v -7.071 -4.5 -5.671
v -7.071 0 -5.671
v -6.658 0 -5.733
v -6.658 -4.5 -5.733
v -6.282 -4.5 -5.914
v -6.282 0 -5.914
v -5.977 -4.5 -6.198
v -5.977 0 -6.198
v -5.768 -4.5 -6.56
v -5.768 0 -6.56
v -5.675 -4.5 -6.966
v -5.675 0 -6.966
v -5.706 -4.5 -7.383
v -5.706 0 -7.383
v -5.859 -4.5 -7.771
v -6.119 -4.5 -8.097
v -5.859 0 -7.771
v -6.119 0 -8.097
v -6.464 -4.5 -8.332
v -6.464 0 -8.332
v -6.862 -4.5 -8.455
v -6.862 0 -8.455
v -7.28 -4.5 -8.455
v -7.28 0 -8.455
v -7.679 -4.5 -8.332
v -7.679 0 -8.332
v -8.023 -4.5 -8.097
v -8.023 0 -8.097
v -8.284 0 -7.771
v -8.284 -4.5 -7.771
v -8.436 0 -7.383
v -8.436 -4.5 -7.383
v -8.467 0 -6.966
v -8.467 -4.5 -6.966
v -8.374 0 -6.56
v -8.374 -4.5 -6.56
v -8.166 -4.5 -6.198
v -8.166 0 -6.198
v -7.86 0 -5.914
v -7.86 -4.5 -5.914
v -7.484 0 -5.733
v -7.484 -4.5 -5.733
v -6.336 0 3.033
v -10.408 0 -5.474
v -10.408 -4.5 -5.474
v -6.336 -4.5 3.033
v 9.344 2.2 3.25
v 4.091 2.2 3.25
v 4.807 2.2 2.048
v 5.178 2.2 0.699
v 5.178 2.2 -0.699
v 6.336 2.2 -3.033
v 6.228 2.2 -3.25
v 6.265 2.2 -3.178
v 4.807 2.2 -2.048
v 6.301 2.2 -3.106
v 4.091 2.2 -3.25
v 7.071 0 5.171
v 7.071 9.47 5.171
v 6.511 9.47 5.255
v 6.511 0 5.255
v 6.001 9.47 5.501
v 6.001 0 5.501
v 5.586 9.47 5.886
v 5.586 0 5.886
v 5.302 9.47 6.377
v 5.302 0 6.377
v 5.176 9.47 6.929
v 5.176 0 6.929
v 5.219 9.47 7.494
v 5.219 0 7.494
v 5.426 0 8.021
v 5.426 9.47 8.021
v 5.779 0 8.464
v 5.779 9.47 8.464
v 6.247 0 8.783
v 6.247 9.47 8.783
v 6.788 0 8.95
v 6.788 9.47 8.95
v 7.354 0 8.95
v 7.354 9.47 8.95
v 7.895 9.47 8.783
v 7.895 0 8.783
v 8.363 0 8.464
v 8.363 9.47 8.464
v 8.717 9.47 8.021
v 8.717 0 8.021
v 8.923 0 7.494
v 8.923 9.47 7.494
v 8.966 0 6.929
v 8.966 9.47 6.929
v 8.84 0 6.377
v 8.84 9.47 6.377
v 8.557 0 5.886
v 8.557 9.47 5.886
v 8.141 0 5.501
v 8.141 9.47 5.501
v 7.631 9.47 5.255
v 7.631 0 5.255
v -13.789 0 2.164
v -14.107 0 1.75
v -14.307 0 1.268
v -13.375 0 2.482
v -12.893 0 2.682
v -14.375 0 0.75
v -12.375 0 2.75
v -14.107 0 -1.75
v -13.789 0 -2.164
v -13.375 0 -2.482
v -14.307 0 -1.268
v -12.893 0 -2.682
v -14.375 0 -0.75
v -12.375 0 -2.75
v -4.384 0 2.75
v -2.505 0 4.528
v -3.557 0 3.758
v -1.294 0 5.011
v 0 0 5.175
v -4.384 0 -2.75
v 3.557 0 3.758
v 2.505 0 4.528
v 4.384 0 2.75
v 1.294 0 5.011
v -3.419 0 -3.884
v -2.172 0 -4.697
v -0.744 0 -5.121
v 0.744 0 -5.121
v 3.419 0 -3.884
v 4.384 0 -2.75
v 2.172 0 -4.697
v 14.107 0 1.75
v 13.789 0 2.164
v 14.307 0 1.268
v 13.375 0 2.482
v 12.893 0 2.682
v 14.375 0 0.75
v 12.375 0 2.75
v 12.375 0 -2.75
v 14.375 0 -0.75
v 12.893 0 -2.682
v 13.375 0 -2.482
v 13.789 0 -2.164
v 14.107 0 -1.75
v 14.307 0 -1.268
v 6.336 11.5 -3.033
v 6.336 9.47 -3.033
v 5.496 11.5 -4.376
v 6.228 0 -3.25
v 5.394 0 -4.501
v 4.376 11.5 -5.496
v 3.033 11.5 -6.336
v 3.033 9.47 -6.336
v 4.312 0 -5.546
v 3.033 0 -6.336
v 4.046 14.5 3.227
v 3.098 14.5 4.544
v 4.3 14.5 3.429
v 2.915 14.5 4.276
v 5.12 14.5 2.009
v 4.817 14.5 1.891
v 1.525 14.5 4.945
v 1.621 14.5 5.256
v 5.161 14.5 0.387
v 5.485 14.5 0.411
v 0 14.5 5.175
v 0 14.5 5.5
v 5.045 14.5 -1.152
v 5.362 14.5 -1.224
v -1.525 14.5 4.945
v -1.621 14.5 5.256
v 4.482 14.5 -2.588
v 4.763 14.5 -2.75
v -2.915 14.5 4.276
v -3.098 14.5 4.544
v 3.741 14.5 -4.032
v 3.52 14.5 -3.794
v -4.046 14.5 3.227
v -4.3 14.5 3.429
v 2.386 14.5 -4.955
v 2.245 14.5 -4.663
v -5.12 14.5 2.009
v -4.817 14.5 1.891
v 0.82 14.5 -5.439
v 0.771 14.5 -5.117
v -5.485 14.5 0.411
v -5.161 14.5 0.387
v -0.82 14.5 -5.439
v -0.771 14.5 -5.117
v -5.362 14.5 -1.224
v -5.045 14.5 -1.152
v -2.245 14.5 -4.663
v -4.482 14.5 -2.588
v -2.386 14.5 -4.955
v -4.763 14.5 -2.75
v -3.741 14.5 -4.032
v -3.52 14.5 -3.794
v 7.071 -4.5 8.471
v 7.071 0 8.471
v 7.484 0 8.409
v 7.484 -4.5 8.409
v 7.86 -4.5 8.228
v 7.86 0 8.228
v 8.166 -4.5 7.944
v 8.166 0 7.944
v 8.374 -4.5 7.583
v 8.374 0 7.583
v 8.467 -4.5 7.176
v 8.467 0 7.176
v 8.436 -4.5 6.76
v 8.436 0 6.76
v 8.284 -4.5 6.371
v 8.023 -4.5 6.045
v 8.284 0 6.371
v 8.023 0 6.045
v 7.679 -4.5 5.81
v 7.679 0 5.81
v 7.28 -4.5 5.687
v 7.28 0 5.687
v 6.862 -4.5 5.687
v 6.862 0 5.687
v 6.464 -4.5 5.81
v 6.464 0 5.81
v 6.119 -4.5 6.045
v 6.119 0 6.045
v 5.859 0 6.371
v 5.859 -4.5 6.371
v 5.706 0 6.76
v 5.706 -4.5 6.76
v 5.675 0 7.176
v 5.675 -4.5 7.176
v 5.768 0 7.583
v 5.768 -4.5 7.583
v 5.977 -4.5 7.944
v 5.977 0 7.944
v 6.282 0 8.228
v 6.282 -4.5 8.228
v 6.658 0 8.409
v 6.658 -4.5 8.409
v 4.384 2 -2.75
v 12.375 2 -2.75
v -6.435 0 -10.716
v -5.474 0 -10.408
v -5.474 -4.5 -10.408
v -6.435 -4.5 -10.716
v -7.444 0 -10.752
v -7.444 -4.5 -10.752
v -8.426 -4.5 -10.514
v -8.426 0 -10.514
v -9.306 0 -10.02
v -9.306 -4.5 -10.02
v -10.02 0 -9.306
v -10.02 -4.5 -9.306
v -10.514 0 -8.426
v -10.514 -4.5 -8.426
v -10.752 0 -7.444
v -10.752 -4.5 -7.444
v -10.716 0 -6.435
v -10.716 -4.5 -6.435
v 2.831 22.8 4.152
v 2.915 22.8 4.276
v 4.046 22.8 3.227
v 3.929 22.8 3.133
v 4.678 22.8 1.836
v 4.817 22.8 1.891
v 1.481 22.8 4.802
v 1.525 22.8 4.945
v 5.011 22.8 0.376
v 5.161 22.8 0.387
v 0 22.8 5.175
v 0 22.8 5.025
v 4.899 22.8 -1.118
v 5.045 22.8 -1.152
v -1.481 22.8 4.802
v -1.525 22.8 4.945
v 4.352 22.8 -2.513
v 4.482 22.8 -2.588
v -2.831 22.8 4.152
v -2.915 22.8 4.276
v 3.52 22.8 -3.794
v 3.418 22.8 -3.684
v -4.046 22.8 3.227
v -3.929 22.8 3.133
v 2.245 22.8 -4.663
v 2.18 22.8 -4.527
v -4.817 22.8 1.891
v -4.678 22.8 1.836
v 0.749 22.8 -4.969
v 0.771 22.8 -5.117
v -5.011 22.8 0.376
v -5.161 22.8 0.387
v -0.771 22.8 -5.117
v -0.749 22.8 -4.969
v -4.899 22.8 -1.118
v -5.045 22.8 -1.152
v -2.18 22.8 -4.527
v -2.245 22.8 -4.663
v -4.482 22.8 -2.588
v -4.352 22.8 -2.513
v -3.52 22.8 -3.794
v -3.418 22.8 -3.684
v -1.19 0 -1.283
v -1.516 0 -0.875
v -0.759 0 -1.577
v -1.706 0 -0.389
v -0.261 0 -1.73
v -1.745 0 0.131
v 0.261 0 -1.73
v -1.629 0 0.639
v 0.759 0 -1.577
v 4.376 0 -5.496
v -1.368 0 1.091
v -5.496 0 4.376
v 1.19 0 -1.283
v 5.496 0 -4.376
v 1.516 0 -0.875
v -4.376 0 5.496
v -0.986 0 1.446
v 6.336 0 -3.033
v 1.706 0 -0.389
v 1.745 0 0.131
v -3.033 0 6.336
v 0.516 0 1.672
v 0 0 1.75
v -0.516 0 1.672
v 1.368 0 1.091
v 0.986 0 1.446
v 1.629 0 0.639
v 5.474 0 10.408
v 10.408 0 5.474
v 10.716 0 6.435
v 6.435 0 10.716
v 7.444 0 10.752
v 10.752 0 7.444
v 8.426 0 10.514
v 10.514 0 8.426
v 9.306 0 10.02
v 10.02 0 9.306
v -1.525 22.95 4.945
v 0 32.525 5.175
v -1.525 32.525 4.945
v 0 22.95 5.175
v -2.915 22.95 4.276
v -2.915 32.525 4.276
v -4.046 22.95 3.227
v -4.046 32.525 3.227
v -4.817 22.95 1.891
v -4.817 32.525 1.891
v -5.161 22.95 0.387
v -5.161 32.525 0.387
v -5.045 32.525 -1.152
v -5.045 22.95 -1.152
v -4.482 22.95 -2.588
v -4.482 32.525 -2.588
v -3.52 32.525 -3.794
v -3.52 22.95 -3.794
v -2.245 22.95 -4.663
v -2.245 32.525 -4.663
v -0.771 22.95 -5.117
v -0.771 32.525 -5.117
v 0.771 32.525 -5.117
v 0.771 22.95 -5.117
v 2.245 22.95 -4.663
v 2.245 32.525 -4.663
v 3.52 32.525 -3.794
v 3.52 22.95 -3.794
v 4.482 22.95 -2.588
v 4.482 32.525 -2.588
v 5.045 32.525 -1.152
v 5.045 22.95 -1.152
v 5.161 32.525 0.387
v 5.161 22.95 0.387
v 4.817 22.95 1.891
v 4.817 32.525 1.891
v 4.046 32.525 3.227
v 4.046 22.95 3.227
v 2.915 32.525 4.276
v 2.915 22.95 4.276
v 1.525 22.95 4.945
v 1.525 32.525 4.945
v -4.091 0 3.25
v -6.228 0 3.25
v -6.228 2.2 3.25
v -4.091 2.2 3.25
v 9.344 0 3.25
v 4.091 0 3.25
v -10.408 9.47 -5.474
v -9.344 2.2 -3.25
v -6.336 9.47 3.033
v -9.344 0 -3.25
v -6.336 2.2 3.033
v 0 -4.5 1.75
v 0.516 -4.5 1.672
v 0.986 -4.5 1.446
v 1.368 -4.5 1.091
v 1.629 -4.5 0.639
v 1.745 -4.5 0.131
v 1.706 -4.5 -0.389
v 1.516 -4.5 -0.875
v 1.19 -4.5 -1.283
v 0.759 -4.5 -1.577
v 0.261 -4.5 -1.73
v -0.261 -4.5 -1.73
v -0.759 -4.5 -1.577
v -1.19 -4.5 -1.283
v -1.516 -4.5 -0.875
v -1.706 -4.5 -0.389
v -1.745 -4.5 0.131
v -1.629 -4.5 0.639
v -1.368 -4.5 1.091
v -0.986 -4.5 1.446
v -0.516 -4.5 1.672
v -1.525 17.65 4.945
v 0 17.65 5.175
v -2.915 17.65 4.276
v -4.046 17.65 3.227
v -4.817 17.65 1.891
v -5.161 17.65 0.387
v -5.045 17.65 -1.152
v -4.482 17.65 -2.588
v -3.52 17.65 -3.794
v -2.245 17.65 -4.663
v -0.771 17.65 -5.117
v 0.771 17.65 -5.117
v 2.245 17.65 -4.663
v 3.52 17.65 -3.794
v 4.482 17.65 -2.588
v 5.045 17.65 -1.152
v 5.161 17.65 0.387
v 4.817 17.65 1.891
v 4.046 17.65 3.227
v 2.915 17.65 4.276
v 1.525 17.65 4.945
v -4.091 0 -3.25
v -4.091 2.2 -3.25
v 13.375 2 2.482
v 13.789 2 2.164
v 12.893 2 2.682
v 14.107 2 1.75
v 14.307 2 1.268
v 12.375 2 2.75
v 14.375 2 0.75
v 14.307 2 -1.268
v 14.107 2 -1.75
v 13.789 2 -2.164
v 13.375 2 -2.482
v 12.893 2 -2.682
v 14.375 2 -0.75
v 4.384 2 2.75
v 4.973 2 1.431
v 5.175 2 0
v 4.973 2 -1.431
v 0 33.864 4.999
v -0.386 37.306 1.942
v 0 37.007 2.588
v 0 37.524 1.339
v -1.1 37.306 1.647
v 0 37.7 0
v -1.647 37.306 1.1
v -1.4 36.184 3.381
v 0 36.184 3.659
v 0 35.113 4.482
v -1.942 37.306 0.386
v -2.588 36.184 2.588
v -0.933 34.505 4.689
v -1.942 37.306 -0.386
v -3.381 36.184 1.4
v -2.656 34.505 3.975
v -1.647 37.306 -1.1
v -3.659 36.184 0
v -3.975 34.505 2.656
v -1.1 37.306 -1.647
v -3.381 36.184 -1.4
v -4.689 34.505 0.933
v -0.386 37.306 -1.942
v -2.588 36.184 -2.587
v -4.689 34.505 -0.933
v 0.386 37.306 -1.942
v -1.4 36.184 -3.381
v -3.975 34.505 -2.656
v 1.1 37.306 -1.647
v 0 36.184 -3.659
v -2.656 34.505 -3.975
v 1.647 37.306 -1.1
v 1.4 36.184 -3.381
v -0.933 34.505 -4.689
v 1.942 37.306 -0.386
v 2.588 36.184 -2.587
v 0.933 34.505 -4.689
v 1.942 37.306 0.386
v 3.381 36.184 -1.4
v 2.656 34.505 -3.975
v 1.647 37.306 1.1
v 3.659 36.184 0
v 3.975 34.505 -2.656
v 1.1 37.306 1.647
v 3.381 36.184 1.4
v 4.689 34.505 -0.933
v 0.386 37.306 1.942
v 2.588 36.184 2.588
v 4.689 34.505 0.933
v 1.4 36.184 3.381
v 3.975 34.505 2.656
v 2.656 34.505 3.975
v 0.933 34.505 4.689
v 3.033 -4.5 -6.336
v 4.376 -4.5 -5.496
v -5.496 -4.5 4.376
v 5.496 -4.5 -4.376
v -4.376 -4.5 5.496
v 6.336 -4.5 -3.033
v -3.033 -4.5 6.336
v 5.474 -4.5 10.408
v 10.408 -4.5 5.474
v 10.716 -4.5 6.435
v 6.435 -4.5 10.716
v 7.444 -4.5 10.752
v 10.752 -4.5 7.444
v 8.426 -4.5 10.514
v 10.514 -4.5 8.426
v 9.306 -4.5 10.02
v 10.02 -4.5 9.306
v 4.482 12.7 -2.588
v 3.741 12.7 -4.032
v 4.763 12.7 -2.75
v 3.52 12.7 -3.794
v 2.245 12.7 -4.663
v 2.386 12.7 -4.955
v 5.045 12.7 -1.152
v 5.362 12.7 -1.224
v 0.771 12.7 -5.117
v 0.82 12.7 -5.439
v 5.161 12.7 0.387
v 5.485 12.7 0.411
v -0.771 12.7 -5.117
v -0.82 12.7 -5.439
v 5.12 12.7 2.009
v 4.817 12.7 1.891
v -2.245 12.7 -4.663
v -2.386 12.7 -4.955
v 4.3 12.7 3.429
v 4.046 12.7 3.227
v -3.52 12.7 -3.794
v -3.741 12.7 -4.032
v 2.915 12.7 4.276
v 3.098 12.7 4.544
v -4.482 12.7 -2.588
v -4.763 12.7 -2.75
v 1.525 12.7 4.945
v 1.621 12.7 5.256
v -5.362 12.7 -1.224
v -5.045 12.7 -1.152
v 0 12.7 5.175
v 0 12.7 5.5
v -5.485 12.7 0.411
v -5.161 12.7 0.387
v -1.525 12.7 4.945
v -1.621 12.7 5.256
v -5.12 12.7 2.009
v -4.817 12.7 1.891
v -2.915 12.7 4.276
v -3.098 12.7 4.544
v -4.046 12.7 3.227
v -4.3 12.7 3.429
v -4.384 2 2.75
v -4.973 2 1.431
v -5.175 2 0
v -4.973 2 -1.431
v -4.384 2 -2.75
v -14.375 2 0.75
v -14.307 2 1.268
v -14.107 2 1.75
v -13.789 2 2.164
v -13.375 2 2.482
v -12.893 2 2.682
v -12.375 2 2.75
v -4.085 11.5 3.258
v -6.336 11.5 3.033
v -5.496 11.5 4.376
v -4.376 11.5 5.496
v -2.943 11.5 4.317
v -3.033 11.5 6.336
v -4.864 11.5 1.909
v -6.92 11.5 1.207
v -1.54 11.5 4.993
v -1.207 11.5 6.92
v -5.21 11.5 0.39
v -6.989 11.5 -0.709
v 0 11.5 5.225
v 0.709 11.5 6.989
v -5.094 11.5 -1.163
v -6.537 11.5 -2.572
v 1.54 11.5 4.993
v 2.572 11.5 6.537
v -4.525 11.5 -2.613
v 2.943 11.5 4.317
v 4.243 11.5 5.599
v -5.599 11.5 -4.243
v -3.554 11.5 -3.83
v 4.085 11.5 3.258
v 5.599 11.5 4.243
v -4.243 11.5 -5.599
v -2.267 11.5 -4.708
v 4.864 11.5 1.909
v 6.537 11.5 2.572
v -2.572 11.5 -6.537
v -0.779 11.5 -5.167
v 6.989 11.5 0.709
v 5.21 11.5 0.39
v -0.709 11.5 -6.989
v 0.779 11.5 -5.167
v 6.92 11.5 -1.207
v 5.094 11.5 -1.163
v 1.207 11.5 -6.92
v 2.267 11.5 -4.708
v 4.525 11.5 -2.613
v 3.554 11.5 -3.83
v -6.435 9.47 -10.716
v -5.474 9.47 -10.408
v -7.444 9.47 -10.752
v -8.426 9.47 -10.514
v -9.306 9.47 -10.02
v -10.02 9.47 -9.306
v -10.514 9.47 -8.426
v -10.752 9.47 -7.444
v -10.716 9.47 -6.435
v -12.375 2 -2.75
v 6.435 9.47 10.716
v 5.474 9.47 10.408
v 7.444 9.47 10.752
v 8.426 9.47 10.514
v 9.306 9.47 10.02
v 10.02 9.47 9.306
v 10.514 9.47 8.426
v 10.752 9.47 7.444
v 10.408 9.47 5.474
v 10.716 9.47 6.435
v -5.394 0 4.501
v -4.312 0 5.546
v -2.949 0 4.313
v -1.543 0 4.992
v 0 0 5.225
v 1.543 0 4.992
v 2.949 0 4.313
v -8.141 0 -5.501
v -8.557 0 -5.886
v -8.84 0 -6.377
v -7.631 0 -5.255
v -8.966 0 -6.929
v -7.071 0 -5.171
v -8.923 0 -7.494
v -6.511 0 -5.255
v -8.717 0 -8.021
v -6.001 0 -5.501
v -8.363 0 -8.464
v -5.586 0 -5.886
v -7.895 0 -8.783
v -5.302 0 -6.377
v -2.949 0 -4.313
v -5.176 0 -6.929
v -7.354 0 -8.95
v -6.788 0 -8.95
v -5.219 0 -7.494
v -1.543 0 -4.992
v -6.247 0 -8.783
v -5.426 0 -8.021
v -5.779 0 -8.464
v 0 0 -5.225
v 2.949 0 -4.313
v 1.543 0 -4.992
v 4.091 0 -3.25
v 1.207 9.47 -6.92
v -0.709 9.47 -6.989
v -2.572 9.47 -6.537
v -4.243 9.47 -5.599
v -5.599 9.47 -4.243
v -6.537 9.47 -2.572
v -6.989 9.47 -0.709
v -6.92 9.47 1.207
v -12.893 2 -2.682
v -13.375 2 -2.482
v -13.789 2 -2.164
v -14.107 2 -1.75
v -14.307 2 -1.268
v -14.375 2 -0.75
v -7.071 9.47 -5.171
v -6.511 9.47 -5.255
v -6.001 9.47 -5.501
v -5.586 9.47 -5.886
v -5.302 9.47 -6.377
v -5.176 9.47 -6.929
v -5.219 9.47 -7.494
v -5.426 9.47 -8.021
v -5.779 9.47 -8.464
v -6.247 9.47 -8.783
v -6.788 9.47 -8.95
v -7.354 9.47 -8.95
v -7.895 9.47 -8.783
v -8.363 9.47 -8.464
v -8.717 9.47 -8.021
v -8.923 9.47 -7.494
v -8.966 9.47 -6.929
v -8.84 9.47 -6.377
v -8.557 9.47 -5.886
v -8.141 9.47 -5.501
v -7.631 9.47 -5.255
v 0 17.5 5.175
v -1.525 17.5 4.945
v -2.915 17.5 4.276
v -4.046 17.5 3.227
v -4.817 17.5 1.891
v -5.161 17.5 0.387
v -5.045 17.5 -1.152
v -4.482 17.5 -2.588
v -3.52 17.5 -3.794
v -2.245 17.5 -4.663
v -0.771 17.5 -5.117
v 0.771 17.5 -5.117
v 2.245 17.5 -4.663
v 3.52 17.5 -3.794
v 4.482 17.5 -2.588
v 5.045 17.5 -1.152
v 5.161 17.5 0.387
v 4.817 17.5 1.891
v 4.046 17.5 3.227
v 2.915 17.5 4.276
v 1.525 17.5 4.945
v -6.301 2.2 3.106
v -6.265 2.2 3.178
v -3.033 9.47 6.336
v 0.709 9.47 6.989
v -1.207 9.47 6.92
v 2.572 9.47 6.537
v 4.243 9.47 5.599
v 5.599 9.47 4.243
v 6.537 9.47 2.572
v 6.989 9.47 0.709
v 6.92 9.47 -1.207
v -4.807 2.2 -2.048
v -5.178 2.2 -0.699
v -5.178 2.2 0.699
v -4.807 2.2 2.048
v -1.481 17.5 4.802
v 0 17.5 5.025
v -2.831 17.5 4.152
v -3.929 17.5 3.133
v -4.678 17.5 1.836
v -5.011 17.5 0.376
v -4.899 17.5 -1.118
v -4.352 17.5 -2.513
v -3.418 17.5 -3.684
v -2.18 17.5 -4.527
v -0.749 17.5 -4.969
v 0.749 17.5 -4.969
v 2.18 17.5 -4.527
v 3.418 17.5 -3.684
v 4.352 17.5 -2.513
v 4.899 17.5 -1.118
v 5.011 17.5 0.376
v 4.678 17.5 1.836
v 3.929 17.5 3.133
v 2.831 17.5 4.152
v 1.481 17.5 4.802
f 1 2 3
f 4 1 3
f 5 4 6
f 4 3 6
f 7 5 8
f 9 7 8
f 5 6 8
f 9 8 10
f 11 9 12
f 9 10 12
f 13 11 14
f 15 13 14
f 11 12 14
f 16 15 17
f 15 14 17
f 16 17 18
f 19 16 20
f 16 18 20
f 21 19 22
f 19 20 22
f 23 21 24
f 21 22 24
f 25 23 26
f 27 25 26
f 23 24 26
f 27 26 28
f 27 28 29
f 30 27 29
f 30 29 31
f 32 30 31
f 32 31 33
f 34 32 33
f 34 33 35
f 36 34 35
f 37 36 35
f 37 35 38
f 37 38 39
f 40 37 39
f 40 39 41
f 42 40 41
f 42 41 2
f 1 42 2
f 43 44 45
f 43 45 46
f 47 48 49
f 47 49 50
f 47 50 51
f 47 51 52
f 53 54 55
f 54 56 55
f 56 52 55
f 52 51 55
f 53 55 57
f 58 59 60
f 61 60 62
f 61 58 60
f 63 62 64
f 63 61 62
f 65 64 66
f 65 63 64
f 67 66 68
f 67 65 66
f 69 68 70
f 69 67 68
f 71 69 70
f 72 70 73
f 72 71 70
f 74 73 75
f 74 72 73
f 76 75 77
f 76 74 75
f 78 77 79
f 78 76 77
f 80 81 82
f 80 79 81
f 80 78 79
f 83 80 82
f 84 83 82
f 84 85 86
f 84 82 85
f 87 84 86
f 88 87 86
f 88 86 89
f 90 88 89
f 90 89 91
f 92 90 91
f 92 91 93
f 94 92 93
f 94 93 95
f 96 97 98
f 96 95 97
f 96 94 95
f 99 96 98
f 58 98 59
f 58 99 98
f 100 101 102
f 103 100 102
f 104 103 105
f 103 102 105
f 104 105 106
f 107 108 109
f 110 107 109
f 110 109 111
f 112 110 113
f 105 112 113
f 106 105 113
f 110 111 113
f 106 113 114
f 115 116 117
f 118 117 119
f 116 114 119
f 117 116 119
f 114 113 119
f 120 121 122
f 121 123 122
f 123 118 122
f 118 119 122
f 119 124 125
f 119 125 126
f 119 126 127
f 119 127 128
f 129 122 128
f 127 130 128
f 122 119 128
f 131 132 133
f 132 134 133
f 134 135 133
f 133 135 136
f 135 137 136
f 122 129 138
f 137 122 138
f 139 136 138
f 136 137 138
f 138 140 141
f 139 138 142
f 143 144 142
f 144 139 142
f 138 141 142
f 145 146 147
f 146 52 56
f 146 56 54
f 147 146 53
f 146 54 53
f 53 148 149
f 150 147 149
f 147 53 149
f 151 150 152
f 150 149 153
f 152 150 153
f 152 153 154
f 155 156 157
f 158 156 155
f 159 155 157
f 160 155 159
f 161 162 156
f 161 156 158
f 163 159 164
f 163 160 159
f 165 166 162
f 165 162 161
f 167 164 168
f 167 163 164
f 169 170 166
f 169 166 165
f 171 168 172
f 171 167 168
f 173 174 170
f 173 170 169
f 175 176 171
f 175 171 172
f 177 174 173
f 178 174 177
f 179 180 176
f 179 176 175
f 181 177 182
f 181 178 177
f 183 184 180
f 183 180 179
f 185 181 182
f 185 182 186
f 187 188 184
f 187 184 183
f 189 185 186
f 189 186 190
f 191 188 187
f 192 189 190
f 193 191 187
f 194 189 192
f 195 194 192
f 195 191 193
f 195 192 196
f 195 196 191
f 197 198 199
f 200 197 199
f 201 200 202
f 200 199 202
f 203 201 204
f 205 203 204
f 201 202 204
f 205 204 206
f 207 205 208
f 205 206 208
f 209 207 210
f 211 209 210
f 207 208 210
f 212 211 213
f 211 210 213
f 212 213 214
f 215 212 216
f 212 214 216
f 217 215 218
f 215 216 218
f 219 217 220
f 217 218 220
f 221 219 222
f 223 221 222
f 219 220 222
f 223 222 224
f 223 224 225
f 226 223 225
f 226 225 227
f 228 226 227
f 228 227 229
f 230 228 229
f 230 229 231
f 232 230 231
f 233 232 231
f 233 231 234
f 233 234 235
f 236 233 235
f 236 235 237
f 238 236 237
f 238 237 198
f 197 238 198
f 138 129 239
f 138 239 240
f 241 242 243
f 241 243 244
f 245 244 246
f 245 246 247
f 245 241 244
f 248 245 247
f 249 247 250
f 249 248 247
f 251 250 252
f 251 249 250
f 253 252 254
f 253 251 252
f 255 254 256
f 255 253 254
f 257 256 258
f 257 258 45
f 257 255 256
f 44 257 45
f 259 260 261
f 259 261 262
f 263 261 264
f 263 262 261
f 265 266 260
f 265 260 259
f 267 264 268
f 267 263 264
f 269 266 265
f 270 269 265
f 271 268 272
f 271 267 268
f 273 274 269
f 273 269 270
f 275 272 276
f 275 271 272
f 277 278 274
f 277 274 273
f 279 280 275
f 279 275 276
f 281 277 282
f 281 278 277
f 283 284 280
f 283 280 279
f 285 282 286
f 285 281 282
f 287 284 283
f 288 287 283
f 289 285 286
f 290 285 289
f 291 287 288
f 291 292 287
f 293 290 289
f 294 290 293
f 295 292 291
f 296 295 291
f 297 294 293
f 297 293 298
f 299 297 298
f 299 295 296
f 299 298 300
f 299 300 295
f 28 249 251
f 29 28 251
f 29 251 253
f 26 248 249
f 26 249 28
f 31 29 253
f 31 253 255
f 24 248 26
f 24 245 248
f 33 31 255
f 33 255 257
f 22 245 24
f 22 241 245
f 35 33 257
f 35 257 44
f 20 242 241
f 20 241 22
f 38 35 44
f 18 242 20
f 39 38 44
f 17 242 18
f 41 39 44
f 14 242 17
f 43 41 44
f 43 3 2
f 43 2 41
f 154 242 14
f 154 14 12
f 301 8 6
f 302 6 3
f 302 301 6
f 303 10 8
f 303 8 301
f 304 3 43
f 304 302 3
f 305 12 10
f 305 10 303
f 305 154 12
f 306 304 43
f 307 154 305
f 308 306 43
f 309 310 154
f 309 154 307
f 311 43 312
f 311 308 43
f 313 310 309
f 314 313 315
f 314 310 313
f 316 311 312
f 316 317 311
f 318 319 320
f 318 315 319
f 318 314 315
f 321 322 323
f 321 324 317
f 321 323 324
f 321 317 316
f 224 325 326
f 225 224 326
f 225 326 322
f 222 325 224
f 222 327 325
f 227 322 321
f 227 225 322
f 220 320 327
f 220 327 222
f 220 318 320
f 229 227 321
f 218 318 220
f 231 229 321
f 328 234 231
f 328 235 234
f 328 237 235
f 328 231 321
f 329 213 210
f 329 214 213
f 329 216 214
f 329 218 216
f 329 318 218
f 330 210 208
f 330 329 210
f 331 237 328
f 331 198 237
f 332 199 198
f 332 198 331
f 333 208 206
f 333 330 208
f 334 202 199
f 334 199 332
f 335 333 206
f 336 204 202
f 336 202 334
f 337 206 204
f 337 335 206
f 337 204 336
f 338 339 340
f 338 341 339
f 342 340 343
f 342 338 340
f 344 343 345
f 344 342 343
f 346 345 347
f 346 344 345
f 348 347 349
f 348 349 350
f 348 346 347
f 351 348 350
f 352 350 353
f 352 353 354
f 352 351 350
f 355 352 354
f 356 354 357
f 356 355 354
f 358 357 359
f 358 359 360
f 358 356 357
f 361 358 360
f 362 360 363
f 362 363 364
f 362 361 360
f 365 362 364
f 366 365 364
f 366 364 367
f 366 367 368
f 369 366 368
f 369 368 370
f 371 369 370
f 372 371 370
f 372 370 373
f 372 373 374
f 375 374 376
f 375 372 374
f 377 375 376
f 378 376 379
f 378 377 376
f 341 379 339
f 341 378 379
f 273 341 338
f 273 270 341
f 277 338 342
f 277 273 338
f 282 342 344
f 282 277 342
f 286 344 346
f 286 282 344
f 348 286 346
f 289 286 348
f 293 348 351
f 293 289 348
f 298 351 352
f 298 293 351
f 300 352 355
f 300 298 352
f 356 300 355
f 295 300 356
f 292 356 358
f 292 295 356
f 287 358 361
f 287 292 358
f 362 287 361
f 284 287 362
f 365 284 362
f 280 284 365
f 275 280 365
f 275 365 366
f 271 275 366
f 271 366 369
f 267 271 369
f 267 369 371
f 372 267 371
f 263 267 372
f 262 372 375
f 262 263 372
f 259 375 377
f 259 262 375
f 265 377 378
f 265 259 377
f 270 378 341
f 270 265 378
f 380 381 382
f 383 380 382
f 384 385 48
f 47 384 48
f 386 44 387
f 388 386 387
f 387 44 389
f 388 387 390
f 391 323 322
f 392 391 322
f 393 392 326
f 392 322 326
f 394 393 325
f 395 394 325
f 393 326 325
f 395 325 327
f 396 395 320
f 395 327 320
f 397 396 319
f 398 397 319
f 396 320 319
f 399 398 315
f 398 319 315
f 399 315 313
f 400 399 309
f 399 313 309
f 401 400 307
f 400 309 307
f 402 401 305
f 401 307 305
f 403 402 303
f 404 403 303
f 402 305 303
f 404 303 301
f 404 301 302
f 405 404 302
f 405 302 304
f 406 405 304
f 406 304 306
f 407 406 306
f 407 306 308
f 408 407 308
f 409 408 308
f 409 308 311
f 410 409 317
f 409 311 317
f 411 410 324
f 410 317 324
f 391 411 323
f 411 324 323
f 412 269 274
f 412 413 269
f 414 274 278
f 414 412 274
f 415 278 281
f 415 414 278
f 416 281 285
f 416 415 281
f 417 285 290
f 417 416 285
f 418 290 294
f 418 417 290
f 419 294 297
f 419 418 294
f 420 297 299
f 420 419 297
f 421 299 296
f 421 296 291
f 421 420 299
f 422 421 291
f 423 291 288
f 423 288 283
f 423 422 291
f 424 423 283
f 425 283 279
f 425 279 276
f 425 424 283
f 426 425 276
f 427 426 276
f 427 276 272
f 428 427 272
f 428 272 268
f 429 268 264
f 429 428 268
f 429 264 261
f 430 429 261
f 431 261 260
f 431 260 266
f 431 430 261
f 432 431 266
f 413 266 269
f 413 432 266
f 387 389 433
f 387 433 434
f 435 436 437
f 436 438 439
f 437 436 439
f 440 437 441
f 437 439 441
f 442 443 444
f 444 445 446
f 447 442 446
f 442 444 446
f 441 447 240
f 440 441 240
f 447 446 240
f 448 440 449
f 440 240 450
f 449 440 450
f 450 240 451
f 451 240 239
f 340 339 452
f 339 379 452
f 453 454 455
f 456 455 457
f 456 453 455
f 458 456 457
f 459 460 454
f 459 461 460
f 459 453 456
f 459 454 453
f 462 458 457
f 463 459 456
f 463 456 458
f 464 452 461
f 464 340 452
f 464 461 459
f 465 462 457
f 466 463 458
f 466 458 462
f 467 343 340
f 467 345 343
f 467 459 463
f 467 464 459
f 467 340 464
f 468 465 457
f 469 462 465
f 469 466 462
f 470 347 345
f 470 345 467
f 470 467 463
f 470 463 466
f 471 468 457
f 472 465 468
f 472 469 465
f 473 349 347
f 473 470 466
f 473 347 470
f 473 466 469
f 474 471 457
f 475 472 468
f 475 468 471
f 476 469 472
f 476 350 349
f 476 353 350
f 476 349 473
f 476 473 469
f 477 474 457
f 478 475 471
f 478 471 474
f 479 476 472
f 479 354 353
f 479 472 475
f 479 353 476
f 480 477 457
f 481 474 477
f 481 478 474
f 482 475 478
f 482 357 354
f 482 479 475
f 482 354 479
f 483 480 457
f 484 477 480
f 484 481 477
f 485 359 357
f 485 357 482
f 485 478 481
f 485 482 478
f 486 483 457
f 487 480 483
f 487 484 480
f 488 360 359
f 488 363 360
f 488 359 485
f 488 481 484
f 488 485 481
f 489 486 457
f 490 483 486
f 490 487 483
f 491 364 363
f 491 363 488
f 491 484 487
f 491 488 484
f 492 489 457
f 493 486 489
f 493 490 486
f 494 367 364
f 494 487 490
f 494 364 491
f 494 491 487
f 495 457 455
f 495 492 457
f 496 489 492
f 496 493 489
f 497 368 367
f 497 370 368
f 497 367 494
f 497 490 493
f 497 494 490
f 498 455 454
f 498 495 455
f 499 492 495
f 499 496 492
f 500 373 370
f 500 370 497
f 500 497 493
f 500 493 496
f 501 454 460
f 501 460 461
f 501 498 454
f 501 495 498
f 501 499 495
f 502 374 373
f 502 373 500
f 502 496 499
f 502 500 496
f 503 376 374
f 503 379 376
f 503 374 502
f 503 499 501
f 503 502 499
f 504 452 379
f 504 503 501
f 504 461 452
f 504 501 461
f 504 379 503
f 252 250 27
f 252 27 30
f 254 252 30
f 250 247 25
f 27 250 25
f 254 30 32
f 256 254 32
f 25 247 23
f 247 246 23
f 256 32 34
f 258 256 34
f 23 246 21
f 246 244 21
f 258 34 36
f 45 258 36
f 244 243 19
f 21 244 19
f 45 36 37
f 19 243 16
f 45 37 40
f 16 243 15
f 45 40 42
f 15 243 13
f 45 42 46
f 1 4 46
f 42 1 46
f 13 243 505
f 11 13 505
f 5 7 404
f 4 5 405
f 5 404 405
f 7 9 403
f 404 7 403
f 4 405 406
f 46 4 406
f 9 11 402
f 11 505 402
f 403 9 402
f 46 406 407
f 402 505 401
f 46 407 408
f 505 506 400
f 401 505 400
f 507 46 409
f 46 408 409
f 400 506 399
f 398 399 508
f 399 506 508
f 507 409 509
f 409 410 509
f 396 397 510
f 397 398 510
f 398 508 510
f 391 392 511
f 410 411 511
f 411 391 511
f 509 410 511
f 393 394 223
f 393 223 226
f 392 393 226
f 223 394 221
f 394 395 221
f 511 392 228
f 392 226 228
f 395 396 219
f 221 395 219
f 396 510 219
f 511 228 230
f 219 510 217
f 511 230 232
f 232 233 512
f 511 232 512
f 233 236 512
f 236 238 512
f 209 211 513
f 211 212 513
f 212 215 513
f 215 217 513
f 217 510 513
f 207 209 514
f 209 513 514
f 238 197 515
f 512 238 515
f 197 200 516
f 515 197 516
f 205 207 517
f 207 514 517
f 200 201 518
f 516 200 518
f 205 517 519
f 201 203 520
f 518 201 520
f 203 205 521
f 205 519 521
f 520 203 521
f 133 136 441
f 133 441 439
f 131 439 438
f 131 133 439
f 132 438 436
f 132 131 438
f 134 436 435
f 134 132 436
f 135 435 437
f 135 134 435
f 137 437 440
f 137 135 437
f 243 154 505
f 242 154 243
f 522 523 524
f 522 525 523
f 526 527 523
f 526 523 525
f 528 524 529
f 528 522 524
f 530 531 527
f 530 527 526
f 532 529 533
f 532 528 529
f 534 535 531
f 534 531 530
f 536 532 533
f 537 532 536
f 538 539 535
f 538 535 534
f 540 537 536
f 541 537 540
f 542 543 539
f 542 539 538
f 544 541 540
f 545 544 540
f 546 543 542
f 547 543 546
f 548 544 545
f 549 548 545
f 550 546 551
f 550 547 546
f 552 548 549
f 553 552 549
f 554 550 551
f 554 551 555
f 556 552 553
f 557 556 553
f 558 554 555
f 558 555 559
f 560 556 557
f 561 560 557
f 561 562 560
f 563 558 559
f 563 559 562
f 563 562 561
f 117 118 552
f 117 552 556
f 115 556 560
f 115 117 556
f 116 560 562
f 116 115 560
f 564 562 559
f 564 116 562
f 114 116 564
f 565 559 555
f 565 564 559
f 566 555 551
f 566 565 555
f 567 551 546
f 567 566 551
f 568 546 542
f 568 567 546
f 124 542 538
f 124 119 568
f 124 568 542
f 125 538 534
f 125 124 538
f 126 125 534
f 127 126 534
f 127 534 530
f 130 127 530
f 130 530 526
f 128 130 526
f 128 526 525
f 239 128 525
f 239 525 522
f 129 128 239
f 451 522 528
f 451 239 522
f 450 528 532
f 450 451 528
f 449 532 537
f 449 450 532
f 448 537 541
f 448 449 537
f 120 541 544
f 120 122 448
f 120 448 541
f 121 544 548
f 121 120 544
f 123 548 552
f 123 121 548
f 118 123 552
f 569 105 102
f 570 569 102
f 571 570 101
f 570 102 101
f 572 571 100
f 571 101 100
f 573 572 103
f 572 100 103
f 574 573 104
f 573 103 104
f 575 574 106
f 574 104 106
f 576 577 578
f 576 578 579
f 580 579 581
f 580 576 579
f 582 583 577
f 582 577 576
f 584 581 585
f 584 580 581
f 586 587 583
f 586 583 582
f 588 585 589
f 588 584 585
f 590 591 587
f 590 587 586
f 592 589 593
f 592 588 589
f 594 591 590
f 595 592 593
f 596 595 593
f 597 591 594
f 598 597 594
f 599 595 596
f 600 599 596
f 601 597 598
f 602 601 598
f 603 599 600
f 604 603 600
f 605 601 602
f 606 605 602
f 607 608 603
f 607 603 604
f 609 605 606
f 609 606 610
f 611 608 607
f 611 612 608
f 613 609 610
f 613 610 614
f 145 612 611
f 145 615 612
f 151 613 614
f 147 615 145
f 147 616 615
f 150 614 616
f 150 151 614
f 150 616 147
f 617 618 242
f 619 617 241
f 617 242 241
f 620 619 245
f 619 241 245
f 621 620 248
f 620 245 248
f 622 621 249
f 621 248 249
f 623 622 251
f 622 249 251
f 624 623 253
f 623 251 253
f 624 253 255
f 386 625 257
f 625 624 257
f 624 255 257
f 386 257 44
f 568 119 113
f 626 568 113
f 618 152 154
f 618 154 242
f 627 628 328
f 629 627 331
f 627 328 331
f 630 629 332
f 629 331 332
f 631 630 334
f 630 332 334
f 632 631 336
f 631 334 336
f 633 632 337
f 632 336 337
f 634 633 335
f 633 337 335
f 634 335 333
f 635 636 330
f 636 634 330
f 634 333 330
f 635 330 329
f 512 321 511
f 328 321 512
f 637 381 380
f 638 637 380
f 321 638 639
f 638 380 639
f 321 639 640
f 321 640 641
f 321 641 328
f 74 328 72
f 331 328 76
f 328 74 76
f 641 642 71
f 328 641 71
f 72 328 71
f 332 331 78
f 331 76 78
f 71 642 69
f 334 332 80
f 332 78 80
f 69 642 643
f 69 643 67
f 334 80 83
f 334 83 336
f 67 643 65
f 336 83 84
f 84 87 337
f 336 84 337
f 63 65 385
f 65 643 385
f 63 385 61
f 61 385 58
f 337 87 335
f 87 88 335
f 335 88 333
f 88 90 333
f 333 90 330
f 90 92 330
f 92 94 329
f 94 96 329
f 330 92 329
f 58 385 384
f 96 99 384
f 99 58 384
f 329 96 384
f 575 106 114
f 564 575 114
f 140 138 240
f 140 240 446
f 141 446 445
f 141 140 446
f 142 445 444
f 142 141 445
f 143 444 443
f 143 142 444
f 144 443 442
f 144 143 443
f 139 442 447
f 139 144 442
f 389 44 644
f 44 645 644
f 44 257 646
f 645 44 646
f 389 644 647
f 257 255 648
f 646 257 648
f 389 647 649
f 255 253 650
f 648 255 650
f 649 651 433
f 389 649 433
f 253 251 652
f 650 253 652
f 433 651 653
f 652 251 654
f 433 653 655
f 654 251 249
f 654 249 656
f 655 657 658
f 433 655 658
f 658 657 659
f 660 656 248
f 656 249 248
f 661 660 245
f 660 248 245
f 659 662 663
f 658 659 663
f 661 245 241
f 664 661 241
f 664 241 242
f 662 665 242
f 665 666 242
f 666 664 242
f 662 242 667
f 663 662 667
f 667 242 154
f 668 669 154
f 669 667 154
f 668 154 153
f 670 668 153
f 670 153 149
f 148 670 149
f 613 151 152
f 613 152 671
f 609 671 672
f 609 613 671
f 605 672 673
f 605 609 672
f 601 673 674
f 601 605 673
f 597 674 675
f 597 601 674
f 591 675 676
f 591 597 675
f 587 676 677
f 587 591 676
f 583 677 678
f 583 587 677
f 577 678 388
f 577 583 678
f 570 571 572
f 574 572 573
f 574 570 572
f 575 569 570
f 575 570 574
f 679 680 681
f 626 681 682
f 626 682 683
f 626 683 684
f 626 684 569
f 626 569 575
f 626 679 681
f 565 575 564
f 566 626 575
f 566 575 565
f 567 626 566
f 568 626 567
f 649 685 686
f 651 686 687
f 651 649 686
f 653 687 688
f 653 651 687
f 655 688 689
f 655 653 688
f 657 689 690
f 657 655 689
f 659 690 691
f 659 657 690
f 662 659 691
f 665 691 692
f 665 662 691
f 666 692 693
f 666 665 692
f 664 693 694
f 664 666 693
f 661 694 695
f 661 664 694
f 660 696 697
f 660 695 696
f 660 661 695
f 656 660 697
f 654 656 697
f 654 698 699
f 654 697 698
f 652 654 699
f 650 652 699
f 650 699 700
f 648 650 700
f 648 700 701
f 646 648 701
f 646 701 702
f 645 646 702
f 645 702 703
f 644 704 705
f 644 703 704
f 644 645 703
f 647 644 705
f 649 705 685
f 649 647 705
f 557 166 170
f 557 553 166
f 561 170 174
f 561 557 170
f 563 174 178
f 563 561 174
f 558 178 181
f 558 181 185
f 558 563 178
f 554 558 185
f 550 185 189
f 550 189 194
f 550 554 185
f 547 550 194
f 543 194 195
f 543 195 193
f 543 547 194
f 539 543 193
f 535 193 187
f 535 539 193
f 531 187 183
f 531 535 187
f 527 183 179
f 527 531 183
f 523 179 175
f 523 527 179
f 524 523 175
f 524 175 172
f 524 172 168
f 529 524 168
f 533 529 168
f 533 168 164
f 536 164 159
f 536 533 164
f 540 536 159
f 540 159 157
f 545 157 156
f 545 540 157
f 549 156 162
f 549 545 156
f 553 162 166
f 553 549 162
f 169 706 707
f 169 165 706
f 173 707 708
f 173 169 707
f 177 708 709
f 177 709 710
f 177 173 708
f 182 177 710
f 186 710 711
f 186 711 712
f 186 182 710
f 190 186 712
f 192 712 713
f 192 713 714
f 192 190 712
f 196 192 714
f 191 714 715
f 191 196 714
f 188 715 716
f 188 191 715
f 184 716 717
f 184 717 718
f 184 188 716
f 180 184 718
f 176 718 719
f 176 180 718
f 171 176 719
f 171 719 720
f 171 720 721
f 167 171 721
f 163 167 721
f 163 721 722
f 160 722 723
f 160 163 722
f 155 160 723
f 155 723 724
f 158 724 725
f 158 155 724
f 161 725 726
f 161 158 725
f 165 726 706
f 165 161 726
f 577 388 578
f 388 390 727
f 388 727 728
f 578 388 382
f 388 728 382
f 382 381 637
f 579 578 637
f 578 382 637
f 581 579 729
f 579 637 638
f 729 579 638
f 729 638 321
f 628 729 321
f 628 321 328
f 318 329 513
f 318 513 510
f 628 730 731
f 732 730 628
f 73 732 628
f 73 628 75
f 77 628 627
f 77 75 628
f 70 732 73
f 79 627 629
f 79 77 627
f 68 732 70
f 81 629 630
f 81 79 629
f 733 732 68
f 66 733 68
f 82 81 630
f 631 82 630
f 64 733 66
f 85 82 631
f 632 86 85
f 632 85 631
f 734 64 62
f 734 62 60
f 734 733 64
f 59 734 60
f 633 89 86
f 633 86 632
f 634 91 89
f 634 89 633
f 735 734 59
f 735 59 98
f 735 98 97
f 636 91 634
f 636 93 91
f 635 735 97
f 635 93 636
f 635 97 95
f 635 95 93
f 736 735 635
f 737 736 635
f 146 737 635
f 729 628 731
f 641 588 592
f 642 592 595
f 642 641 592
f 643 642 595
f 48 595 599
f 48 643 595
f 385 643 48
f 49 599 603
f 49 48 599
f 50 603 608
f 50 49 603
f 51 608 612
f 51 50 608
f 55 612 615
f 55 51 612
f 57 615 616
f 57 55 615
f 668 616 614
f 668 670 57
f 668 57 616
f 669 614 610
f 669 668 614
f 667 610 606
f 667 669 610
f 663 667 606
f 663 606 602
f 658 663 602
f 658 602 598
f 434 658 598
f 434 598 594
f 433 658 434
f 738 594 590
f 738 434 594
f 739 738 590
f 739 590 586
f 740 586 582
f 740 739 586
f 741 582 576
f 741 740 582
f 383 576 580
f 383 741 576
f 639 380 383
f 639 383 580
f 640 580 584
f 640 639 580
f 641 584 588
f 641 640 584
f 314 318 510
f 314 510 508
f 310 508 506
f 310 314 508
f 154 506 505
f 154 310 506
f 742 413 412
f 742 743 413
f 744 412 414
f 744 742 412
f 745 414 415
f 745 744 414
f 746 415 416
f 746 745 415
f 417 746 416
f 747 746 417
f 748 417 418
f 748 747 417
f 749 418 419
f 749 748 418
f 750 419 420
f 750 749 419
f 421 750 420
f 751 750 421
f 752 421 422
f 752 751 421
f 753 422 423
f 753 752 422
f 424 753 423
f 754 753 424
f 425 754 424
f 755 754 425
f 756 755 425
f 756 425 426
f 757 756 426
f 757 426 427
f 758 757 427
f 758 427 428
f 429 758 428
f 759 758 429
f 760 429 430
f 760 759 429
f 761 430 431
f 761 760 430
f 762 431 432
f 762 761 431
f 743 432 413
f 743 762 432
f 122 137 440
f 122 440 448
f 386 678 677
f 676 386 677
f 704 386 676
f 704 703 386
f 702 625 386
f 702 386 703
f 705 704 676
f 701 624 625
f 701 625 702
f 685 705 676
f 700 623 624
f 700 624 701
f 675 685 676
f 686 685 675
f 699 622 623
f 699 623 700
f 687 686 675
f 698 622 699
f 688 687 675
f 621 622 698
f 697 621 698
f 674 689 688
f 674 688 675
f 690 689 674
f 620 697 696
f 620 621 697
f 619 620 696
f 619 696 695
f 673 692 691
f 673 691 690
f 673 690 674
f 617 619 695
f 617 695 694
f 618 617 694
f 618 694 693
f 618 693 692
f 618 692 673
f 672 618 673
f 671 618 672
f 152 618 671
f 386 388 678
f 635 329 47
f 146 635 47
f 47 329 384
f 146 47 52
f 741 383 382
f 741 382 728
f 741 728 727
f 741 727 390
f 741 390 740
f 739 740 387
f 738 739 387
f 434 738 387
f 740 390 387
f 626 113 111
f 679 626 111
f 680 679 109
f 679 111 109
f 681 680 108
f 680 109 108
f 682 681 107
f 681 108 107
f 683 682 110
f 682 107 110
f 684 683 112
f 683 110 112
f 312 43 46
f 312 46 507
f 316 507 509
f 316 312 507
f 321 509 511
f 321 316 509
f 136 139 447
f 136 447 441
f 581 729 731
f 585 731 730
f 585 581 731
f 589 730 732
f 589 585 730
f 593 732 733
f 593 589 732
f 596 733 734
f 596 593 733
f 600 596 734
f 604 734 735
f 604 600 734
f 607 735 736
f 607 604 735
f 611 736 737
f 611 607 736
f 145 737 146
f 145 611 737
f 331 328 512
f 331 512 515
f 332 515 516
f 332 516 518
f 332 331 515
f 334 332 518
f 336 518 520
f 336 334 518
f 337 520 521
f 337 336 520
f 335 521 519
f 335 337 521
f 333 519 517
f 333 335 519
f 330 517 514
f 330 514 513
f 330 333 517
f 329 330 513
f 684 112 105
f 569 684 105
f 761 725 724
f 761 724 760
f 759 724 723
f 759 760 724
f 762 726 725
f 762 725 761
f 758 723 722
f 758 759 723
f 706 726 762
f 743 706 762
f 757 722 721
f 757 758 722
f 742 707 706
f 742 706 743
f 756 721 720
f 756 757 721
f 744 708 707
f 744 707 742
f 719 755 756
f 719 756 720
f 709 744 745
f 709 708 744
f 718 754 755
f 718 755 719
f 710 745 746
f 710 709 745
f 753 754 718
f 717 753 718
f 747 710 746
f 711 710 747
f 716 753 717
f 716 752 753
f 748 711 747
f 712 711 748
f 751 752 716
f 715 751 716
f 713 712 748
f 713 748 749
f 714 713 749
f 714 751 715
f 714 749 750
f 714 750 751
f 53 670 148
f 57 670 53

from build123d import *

# Parameters (mm, degrees)
SKETCH1_R               = 15
SKETCH1_R_2             = 1.75
BOSS_EXTRUDE1_DEPTH     = 4.5
SKETCH2_R               = 5.225
SKETCH2_R_2             = 1.9
BOSS_EXTRUDE2_DEPTH     = 11.5
SKETCH3_W               = 31.199300702
SKETCH3_H               = 26.807769262
SKETCH3_R               = 7.025
CUT_EXTRUDE1_DEPTH      = 2.03
CUT_EXTRUDE2_DEPTH      = 25.129857024
CUT_EXTRUDE2_DEPTH_BACK = 25.129857024
SKETCH4_W               = 6.5
SKETCH4_H               = 2.2
SKETCH5_R               = 15
SKETCH5_R_2             = 1.4
CUT_EXTRUDE4_DEPTH      = 25.129857024
BOSS_EXTRUDE3_DEPTH     = 2


with BuildPart() as part:
    # Sketch1 → Boss-Extrude1 (new body)
    with BuildSketch(Plane(origin=(0, 0, 0), x_dir=(1, 0, 0), z_dir=(0, 1, 0))):
        Circle(SKETCH1_R)
        Circle(SKETCH1_R_2, mode=Mode.SUBTRACT)
    extrude(amount=-BOSS_EXTRUDE1_DEPTH)

    # Sketch5 → Cut-Extrude4 (cut, through all)
    # profile 1 of 3: a face of its own
    with BuildSketch(Plane(origin=(0, 0, 0), x_dir=(1, 0, 0), z_dir=(0, 1, 0))):
        Circle(SKETCH5_R)
        with BuildLine():
            Line((-6.336463676, -3.033125959), (-10.408422346, 5.473549513))
            ThreePointArc((-10.408422346, 5.473549513), (-9.687362902, 9.687362902), (-5.473549513, 10.408422346))
            Line((-5.473549513, 10.408422346), (3.033125959, 6.336463676))
            ThreePointArc((3.033125959, 6.336463676), (4.967425138, 4.967425138), (6.336463676, 3.033125959))
            Line((6.336463676, 3.033125959), (10.408422346, -5.473549513))
            ThreePointArc((10.408422346, -5.473549513), (9.687362902, -9.687362902), (5.473549513, -10.408422346))
            Line((5.473549513, -10.408422346), (-3.033125959, -6.336463676))
            ThreePointArc((-3.033125959, -6.336463676), (-4.967425138, -4.967425138), (-6.336463676, -3.033125959))
        make_face(mode=Mode.SUBTRACT)
    # profile 2 of 3: a face of its own
    with BuildSketch(Plane(origin=(0, 0, 0), x_dir=(1, 0, 0), z_dir=(0, 1, 0))):
        with Locations((-7.071067812, 7.071067812)):
            Circle(SKETCH5_R_2)
    # profile 3 of 3: a face of its own
    with BuildSketch(Plane(origin=(0, 0, 0), x_dir=(1, 0, 0), z_dir=(0, 1, 0))):
        with Locations((7.071067812, -7.071067812)):
            Circle(SKETCH5_R_2)
    extrude(amount=-CUT_EXTRUDE4_DEPTH, mode=Mode.SUBTRACT)


with BuildPart() as body_2:
    # Sketch2 → Boss-Extrude2 (new body)
    with BuildSketch(Plane(origin=(0, 0, 0), x_dir=(1, 0, 0), z_dir=(0, 1, 0))):
        with BuildLine():
            Line((-10.408422346, 5.473549513), (-6.336463676, -3.033125959))
            ThreePointArc((-6.336463676, -3.033125959), (-4.967425138, -4.967425138), (-3.033125959, -6.336463676))
            Line((-3.033125959, -6.336463676), (5.473549513, -10.408422346))
            ThreePointArc((5.473549513, -10.408422346), (9.687362902, -9.687362902), (10.408422346, -5.473549513))
            Line((10.408422346, -5.473549513), (6.336463676, 3.033125959))
            ThreePointArc((6.336463676, 3.033125959), (4.967425138, 4.967425138), (3.033125959, 6.336463676))
            Line((3.033125959, 6.336463676), (-5.473549513, 10.408422346))
            ThreePointArc((-5.473549513, 10.408422346), (-9.687362902, 9.687362902), (-10.408422346, 5.473549513))
        make_face()
        Circle(SKETCH2_R, mode=Mode.SUBTRACT)
        with Locations((-7.071067812, 7.071067812)):
            Circle(SKETCH2_R_2, mode=Mode.SUBTRACT)
        with Locations((7.071067812, -7.071067812)):
            Circle(SKETCH2_R_2, mode=Mode.SUBTRACT)
    extrude(amount=BOSS_EXTRUDE2_DEPTH)

    # Sketch3 → Cut-Extrude1 (cut)
    with BuildSketch(Plane(origin=(0, 11.5, 0), x_dir=(1, 0, 0), z_dir=(0, 1, 0))):
        Rectangle(SKETCH3_W, SKETCH3_H)
        Circle(SKETCH3_R, mode=Mode.SUBTRACT)
    extrude(amount=-CUT_EXTRUDE1_DEPTH, mode=Mode.SUBTRACT)

    # Sketch4 → Cut-Extrude2 (cut, two sides: drawn at the far end of the back side and taken through both)
    with BuildSketch(Plane(origin=(0, 0, 0), x_dir=(0, 0, -1), z_dir=(1, 0, 0)).offset(-CUT_EXTRUDE2_DEPTH_BACK)):
        with Locations((0, 1.1)):
            Rectangle(SKETCH4_W, SKETCH4_H)
    extrude(amount=CUT_EXTRUDE2_DEPTH + CUT_EXTRUDE2_DEPTH_BACK, mode=Mode.SUBTRACT)


with BuildPart() as body_3:
    # Sketch8 → Revolve1 (revolve)
    with BuildSketch(Plane(origin=(0, 0, 0), x_dir=(0, 0, -1), z_dir=(1, 0, 0))):
        with BuildLine():
            Line((0, 32.525), (0, 37.7))
            ThreePointArc((0, 37.7), (-3.659277593, 36.184277593), (-5.175, 32.525))
            Line((-5.175, 32.525), (-5.175, 22.95))
            Line((-5.175, 22.95), (-5.025, 22.8))
            Line((-5.025, 22.8), (-5.175, 22.8))
            Line((-5.175, 22.8), (-5.175, 17.65))
            Line((-5.175, 17.65), (-5.025, 17.5))
            Line((-5.025, 17.5), (-5.175, 17.5))
            Line((-5.175, 17.5), (-5.175, 14.5))
            Line((-5.175, 14.5), (-5.5, 14.5))
            Line((-5.5, 14.5), (-5.5, 12.7))
            Line((-5.5, 12.7), (-5.175, 12.7))
            Line((-5.175, 12.7), (-5.175, 0))
            Line((-5.175, 0), (0, 0))
            Line((0, 0), (0, 32.525))
        make_face()
    revolve(axis=Axis((0, 0, 0), (0, -1, 0)))

    # Sketch9 → Boss-Extrude3 (add)
    with BuildSketch(Plane(origin=(0, 0, 0), x_dir=(1, 0, 0), z_dir=(0, 1, 0))):
        with BuildLine():
            Line((-12.375, -2.75), (-2.375, -2.75))
            Line((-2.375, -2.75), (-2.375, 2.75))
            Line((-2.375, 2.75), (-12.375, 2.75))
            ThreePointArc((-12.375, 2.75), (-13.789213562, 2.164213562), (-14.375, 0.75))
            Line((-14.375, 0.75), (-14.375, -0.75))
            ThreePointArc((-14.375, -0.75), (-13.789213562, -2.164213562), (-12.375, -2.75))
        make_face()
        with BuildLine():
            Line((2.375, -2.75), (2.375, 2.75))
            Line((2.375, 2.75), (12.375, 2.75))
            ThreePointArc((12.375, 2.75), (13.789213562, 2.164213562), (14.375, 0.75))
            Line((14.375, 0.75), (14.375, -0.75))
            ThreePointArc((14.375, -0.75), (13.789213562, -2.164213562), (12.375, -2.75))
            Line((12.375, -2.75), (2.375, -2.75))
        make_face()
    extrude(amount=BOSS_EXTRUDE3_DEPTH)


solid = Compound([part.part, body_2.part, body_3.part])
